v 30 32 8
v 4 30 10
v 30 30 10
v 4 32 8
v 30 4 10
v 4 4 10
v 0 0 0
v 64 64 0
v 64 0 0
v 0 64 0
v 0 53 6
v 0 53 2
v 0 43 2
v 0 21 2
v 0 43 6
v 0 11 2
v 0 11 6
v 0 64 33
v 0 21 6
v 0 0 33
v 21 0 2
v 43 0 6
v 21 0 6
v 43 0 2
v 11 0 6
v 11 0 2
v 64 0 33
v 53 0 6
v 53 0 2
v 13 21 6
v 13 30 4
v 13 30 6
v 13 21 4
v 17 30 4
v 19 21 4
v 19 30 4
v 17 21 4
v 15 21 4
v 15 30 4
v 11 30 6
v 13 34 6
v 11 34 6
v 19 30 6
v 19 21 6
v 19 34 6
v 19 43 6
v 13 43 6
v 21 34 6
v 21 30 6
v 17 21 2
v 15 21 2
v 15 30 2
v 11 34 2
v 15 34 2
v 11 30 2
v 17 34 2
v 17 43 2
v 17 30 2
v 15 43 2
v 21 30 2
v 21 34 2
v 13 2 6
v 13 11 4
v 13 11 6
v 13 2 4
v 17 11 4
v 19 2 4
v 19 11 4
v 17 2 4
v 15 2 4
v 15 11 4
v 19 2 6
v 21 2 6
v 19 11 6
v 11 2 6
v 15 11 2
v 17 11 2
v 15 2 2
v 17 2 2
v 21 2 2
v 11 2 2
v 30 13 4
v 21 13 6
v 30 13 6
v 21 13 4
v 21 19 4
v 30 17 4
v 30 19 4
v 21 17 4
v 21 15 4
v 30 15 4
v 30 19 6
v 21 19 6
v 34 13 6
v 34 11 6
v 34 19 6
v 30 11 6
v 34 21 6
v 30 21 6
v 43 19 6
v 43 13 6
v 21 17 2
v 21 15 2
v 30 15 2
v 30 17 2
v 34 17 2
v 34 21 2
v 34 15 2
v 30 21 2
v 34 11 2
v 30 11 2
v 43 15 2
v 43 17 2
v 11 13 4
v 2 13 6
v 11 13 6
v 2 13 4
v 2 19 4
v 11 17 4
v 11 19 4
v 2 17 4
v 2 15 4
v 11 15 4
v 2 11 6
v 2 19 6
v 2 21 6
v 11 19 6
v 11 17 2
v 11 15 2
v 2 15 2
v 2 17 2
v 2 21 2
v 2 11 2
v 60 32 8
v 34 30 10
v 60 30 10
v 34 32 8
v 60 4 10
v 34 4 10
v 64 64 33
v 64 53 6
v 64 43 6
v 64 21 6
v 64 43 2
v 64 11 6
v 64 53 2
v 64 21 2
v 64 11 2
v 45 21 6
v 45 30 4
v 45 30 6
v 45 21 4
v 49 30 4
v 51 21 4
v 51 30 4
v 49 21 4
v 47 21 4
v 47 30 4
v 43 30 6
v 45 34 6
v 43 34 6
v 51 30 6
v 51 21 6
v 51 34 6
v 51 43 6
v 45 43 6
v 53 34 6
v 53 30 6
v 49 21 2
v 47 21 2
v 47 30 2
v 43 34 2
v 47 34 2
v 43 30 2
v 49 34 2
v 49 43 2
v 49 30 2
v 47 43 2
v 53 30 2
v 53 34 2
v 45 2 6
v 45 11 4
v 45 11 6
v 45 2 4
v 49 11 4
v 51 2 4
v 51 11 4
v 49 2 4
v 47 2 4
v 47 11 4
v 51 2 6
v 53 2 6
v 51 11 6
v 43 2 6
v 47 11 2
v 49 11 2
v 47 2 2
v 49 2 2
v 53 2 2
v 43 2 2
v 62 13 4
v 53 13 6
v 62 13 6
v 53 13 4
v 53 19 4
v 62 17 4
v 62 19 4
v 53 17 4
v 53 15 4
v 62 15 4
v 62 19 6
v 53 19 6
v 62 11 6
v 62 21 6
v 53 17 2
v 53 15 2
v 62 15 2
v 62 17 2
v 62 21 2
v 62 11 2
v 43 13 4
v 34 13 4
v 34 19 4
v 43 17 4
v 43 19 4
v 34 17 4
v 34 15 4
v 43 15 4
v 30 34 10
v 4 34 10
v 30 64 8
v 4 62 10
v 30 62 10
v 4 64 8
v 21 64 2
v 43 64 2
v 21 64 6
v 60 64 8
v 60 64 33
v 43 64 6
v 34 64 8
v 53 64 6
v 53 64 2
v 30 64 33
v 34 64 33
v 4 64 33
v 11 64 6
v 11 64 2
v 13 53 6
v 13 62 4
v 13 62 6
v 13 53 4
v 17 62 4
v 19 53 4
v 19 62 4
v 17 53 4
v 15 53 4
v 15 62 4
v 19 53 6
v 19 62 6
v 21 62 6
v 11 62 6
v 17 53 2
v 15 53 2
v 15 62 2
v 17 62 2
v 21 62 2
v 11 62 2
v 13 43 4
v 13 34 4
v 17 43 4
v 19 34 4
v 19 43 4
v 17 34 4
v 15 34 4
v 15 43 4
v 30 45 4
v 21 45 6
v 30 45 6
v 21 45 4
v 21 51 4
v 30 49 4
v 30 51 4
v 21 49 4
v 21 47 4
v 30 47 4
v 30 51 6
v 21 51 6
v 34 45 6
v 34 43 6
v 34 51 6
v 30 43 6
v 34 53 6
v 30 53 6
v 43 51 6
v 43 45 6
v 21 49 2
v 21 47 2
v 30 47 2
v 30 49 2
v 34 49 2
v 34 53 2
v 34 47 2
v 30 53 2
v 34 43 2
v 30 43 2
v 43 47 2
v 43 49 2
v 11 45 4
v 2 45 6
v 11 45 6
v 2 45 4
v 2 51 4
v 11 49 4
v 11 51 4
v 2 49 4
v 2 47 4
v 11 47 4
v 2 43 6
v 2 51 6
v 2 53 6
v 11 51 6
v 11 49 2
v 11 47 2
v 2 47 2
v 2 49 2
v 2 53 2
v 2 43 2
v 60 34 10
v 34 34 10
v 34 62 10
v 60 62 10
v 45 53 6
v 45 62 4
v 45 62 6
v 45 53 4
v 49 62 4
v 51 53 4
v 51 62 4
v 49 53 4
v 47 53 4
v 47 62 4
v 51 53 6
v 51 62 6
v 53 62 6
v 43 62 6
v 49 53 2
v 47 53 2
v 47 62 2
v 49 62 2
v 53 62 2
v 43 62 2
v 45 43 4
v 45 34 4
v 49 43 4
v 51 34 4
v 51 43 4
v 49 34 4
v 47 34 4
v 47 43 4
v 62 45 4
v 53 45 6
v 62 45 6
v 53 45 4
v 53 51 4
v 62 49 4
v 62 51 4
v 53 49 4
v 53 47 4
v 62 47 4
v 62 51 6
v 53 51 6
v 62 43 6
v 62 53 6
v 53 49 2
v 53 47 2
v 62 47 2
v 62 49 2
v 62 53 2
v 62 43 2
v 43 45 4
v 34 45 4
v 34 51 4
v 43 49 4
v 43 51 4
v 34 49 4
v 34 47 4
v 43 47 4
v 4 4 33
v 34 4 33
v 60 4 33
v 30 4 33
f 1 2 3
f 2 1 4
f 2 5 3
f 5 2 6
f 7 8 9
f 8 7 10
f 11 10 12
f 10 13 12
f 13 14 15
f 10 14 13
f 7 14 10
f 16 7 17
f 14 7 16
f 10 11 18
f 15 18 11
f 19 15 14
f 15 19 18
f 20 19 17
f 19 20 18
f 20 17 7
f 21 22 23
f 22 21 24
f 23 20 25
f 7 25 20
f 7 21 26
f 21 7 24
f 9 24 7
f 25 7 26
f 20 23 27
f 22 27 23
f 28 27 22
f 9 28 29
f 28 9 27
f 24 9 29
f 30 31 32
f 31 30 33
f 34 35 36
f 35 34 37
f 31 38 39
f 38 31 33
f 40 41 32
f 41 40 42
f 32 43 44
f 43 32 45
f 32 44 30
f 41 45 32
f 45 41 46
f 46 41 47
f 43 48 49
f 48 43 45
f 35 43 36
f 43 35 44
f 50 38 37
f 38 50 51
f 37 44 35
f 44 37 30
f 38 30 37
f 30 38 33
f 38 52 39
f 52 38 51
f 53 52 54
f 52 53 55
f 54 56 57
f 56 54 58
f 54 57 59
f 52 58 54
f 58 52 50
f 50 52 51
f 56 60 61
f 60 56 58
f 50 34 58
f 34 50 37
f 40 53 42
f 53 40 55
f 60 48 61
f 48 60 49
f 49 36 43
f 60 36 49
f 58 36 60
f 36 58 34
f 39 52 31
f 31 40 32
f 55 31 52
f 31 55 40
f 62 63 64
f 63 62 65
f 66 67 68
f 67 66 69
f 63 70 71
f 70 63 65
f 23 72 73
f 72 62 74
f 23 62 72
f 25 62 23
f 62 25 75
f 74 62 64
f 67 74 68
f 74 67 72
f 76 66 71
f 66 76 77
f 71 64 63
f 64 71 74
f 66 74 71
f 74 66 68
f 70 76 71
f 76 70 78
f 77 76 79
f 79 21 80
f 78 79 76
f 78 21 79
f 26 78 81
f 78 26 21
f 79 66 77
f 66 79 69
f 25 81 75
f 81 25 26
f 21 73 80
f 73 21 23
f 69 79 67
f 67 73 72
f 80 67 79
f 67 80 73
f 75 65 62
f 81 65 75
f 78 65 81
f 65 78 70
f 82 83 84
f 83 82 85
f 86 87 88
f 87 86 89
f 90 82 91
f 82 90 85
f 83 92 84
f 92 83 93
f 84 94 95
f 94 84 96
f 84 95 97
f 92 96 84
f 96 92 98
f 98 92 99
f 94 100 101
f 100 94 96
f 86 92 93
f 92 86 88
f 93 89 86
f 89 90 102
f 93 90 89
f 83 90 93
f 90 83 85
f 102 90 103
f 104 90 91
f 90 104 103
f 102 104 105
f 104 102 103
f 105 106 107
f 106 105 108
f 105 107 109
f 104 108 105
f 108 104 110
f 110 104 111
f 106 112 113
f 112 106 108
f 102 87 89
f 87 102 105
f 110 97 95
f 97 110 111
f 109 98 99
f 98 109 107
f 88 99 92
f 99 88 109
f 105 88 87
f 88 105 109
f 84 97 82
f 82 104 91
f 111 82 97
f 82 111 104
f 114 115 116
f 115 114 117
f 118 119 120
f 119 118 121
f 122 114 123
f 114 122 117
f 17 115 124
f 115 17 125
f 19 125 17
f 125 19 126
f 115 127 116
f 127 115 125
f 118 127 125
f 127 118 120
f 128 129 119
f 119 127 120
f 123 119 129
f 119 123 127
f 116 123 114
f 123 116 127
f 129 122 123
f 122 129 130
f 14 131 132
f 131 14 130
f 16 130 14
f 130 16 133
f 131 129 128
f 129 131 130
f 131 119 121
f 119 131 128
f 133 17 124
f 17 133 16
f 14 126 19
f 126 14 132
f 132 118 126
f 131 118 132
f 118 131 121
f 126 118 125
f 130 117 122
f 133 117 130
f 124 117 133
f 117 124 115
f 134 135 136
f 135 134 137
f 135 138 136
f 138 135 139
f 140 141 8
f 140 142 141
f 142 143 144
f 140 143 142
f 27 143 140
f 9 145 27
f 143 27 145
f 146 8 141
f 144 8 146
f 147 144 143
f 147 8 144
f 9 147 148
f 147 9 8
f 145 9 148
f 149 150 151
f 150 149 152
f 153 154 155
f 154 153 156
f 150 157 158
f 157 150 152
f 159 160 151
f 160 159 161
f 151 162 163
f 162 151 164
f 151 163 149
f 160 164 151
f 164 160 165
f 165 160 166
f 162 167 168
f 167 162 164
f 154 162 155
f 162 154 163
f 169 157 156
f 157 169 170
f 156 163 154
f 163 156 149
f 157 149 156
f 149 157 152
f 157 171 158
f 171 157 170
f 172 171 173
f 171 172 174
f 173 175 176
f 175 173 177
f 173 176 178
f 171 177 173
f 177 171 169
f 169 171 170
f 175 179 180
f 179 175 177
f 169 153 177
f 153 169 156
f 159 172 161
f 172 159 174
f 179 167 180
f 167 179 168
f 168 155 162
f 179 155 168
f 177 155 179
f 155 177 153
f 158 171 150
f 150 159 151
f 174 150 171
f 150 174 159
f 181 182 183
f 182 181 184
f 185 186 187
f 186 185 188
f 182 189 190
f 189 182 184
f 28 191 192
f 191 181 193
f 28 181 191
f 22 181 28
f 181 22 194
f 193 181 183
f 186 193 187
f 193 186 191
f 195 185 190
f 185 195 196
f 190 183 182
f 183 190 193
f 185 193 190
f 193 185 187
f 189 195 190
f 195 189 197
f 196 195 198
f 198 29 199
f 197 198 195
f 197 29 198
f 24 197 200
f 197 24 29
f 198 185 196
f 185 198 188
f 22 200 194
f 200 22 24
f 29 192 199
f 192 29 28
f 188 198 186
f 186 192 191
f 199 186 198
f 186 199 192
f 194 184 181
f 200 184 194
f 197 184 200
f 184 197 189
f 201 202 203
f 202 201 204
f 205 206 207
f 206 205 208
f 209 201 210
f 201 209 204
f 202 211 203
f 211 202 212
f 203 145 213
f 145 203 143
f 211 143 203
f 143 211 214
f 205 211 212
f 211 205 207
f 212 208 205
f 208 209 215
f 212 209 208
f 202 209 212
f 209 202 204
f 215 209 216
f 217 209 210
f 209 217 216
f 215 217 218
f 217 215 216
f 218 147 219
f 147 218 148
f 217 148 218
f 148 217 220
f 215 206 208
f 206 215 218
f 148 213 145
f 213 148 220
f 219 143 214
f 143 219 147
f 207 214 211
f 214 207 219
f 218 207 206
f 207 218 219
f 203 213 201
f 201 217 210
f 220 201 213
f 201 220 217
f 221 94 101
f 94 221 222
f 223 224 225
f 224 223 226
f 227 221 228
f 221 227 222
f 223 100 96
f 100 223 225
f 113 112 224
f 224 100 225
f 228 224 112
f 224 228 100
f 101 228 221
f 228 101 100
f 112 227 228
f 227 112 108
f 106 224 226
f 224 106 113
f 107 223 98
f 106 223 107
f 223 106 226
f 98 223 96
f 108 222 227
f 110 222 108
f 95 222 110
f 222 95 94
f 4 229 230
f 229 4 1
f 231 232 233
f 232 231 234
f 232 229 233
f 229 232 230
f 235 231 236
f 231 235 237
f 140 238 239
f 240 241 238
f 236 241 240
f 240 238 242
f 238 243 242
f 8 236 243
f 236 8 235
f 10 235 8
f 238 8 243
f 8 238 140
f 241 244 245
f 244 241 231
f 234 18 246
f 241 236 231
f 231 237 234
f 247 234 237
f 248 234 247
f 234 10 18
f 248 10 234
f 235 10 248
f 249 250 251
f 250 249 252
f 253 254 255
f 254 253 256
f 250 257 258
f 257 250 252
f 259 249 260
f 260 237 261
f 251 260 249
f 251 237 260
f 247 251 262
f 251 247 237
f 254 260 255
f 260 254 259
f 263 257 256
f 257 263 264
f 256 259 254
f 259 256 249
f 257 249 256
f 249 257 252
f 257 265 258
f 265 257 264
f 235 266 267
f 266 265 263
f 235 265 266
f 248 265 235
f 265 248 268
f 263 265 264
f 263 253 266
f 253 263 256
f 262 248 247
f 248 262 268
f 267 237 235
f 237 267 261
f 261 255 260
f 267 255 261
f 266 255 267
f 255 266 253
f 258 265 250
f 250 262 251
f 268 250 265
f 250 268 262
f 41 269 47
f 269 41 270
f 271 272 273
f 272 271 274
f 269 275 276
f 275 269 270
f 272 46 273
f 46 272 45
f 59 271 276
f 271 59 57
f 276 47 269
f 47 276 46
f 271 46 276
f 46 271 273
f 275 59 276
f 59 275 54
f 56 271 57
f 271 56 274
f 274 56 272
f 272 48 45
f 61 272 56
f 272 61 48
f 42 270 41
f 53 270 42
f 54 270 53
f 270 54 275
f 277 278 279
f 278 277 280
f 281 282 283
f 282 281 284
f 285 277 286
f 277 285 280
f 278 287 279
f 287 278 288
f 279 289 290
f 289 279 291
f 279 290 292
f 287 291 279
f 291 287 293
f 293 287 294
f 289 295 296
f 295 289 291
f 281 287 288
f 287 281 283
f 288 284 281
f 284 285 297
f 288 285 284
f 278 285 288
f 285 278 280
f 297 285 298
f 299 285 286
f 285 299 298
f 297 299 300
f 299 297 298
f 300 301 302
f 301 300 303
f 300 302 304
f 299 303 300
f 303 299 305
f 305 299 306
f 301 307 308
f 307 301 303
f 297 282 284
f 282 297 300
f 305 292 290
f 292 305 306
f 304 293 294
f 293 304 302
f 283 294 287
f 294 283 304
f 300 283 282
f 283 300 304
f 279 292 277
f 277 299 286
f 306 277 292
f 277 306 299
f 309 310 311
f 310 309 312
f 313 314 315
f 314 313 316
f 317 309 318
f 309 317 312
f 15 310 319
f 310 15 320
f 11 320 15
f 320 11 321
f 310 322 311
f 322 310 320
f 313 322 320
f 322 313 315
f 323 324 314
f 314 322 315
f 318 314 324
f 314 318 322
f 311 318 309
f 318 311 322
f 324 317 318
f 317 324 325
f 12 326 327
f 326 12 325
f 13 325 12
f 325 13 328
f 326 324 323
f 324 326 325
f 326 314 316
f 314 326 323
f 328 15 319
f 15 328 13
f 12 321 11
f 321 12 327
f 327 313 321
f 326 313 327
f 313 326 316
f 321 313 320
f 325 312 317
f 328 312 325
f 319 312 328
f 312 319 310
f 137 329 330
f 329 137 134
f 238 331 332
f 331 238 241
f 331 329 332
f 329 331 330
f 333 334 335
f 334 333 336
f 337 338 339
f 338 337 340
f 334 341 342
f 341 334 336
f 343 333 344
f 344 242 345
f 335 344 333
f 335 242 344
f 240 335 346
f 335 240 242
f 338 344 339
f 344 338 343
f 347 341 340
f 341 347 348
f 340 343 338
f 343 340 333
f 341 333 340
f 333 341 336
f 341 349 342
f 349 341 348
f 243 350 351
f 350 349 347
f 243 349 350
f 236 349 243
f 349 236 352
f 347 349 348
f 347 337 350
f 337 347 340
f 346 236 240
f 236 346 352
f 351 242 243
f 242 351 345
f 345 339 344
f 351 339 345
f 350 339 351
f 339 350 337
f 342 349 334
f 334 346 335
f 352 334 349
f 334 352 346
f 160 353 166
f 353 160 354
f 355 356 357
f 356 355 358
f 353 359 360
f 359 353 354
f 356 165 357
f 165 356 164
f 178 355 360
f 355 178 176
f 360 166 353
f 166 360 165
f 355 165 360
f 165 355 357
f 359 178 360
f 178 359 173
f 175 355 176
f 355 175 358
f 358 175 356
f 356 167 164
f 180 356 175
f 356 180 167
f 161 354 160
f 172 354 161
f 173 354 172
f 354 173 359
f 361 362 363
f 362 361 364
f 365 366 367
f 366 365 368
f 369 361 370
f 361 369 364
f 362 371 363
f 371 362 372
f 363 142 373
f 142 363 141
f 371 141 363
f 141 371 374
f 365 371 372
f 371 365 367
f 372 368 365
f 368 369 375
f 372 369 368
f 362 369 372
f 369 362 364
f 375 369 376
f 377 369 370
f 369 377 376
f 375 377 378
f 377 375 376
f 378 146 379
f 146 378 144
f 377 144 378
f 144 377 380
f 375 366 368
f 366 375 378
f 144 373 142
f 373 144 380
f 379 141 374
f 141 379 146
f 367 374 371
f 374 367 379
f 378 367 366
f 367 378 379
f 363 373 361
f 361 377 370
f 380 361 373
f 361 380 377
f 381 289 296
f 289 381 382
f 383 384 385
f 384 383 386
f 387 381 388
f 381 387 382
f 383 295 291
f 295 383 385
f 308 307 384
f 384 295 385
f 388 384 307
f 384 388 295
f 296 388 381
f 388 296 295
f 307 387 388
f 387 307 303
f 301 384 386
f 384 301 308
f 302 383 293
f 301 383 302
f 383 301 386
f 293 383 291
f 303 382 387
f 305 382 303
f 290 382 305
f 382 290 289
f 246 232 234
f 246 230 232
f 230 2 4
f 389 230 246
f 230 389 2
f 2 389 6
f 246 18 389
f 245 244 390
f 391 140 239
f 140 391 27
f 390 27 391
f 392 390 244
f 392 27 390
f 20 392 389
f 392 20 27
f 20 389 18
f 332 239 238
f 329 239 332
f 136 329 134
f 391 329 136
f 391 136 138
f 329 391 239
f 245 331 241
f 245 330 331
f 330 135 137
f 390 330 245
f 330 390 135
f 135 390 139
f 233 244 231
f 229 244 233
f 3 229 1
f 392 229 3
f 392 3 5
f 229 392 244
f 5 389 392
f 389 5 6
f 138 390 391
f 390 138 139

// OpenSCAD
// file: ModularDungeonTileLibrary.scad
//Constants
wallleft = 0;
wallbottom = 1;
wallright = 2;
walltop = 3;
wallcenter = 4;
walldoubleright = 5;


//Variables
size = 32;
connectorlength = size-10;
connectorwidth = 6;
connectorheight = 4;
baseheight = 8;
topperheight = 2;
topperrounded = true;
walllength = size;
wallheight = 25;
wallwidth = 6;
wallwidththin = 4;


//Functions
function hypotenuse_ra(side_a, side_b) =
    sqrt(pow(side_a, 2) + pow(side_b, 2));
    
    
//Modules    
module mtdl_Base_Connector(cw,cl,ch) {
    translate([-connectorwidth/2,-connectorlength/2,-connectorheight/2]) {
        cube([cw,cl,ch/2]);
        translate([cw/3,0,ch/2])
            cube([cw/3,cl,ch/2]);
        translate([-(cw-2)/2,cl/2-2,0])
            cube([cw+4,4,ch]);
    }
}

module mdtl_Base(s,bh)
{
    cube([s,s,bh]);
}

module mdtl_Topper(s,bh,th,tr)
{
    if (tr) {
        translate([0,0,bh])
            intersection() {
                difference () {
                        cube([s,s,th]);
                        union () {
                        rotate(a=45, v=[1,0,0])
                            cube([s,th*2,th*2]);
                        translate([0,s,0])
                            rotate(a=45, v=[1,0,0])
                                cube([s,th*2,th*2]);
                        rotate(a=-45, v=[0,1,0])
                            cube([th*2,s,th*2]);
                        translate([s,0,0])
                            rotate(a=-45, v=[0,1,0])
                                cube([th*2,s,th*2]);
                        }
                }
                translate([s/2,s/2,0])
                    cylinder(
                        h=th, 
                        r1=hypotenuse_ra(s/2-1.2, s/2-1.2), 
                        r2=hypotenuse_ra(s/2-th-.8, s/2-th-.8), 
                        center=false, 
                        $fa=.1);
            }    
    }
    else {
        translate([0,0,bh])
            difference() {
                cube([s,s,th]);
                union () {
                rotate(a=45, v=[1,0,0])
                    cube([s,th*2,th*2]);
                translate([0,s,0])
                    rotate(a=45, v=[1,0,0])
                        cube([s,th*2,th*2]);
                rotate(a=-45, v=[0,1,0])
                    cube([th*2,s,th*2]);
                translate([s,0,0])
                    rotate(a=-45, v=[0,1,0])
                        cube([th*2,s,th*2]);
                }
            }    
    }
}

module mdtl_Base_1x1(s,bh,th,tr) 
{
    difference () {
        union () {
            mdtl_Base(s,bh);
            mdtl_Topper(s,bh,th,tr);
        }
        union () {
            translate([size/2,size,baseheight/2])
                rotate([0,180,0])
                    mtdl_Base_Connector(connectorwidth,connectorlength,connectorheight);
            translate([size/2,0,baseheight/2])
                rotate([0,180,0])
                    mtdl_Base_Connector(connectorwidth,connectorlength,connectorheight);
            translate([size,size/2,baseheight/2])
                rotate([0,180,90])
                    mtdl_Base_Connector(connectorwidth,connectorlength,connectorheight);
            translate([0,size/2,baseheight/2])
                rotate([0,180,90])
                    mtdl_Base_Connector(connectorwidth,connectorlength,connectorheight);
        }
    }
}

module mdtl_Base_1x2(s,bh,th,tr)
{
    union () {
        mdtl_Base_1x1(s,bh,th,tr);
        translate([s,0,0])
            mdtl_Base_1x1(s,bh,th,tr);
    }
}
 
module mdtl_Base_2x2(s,bh,th,tr)
{
    union () {
        mdtl_Base_1x2(s,bh,th,tr);
        translate([0,s,0])
            mdtl_Base_1x2(s,bh,th,tr);
    }
}
 
module mdtl_Base_2x4(s,bh,th,tr)
{
    union () {
        mdtl_Base_2x2(s,bh,th,tr);
        translate([s*2,0,0])
            mdtl_Base_2x2(s,bh,th,tr);
    }
}
 
module mdtl_Base_4x4(s,bh,th,tr)
{
    union () {
        mdtl_Base_2x4(s,bh,th,tr);
        translate([0,s*2,0])
            mdtl_Base_2x4(s,bh,th,tr);
    }
}
 
module mdtl_Wall_1(w,l,h)
{
    translate([0,0,baseheight])
        cube([w,l,h]);   
}

module mdtl_Wall_1_Position(w,l,h,p)
{
    if (p==0) {
        mdtl_Wall_1(w,l,h);
    }
    
    else if (p==1) {
        rotate(a=-90)
           translate([-w,0,0])
               mdtl_Wall_1(w,l,h);       
    }
    
    else if (p==2) {
        translate([(size)-w,0,0])
            mdtl_Wall_1(w,l,h);
    }
    
    else if (p==3) {
        rotate(a=-90)
            translate([-l,0,0])
                mdtl_Wall_1(w,l,h);
    }
    
    else if (p==4) {
        translate([(size)-w/2,0,0])
            mdtl_Wall_1(w,l,h);
    }
    
    else if (p==5) {
        translate([(size*2)-w,0,0])
           mdtl_Wall_1(w,l,h);       
    }
}

module mdtl_Wall_2(w,l,h)
{
    union() {
        mdtl_Wall_1(w,l,h);
        translate([0,l,0])
            mdtl_Wall_1(w,l,h);
    }
}

module mdtl_Wall_2_Position(w,l,h,p)
{
    if (p==0) {
        mdtl_Wall_2(w,l,h);
    }
    
    else if (p==1) {
        rotate(a=-90)
            translate([-w,0,0])
                mdtl_Wall_2(w,l,h);
    }
    
    else if (p==2) {
    translate([(size*2)-w,0,0])
        mdtl_Wall_2(w,l,h);
    }
    
    else if (p==3) {
        rotate(a=-90)
            translate([-l*2,0,0])
                mdtl_Wall_2(w,l,h);
    }
    
    else if (p==4) {
        translate([(size)-w/2,0,0])
            mdtl_Wall_2(w,l,h);
    }
}
// main file
include <ModularDungeonTileLibrary.scad>; 
 
mdtl_Base_2x2(size,baseheight,topperheight,topperrounded=false);
mdtl_Wall_2_Position(wallwidththin,walllength,wallheight,wallleft);
mdtl_Wall_2_Position(wallwidththin,walllength,wallheight,wallright);
mdtl_Wall_2_Position(wallwidththin,walllength,wallheight,wallcenter);
mdtl_Wall_2_Position(wallwidththin,walllength,wallheight,wallbottom);
